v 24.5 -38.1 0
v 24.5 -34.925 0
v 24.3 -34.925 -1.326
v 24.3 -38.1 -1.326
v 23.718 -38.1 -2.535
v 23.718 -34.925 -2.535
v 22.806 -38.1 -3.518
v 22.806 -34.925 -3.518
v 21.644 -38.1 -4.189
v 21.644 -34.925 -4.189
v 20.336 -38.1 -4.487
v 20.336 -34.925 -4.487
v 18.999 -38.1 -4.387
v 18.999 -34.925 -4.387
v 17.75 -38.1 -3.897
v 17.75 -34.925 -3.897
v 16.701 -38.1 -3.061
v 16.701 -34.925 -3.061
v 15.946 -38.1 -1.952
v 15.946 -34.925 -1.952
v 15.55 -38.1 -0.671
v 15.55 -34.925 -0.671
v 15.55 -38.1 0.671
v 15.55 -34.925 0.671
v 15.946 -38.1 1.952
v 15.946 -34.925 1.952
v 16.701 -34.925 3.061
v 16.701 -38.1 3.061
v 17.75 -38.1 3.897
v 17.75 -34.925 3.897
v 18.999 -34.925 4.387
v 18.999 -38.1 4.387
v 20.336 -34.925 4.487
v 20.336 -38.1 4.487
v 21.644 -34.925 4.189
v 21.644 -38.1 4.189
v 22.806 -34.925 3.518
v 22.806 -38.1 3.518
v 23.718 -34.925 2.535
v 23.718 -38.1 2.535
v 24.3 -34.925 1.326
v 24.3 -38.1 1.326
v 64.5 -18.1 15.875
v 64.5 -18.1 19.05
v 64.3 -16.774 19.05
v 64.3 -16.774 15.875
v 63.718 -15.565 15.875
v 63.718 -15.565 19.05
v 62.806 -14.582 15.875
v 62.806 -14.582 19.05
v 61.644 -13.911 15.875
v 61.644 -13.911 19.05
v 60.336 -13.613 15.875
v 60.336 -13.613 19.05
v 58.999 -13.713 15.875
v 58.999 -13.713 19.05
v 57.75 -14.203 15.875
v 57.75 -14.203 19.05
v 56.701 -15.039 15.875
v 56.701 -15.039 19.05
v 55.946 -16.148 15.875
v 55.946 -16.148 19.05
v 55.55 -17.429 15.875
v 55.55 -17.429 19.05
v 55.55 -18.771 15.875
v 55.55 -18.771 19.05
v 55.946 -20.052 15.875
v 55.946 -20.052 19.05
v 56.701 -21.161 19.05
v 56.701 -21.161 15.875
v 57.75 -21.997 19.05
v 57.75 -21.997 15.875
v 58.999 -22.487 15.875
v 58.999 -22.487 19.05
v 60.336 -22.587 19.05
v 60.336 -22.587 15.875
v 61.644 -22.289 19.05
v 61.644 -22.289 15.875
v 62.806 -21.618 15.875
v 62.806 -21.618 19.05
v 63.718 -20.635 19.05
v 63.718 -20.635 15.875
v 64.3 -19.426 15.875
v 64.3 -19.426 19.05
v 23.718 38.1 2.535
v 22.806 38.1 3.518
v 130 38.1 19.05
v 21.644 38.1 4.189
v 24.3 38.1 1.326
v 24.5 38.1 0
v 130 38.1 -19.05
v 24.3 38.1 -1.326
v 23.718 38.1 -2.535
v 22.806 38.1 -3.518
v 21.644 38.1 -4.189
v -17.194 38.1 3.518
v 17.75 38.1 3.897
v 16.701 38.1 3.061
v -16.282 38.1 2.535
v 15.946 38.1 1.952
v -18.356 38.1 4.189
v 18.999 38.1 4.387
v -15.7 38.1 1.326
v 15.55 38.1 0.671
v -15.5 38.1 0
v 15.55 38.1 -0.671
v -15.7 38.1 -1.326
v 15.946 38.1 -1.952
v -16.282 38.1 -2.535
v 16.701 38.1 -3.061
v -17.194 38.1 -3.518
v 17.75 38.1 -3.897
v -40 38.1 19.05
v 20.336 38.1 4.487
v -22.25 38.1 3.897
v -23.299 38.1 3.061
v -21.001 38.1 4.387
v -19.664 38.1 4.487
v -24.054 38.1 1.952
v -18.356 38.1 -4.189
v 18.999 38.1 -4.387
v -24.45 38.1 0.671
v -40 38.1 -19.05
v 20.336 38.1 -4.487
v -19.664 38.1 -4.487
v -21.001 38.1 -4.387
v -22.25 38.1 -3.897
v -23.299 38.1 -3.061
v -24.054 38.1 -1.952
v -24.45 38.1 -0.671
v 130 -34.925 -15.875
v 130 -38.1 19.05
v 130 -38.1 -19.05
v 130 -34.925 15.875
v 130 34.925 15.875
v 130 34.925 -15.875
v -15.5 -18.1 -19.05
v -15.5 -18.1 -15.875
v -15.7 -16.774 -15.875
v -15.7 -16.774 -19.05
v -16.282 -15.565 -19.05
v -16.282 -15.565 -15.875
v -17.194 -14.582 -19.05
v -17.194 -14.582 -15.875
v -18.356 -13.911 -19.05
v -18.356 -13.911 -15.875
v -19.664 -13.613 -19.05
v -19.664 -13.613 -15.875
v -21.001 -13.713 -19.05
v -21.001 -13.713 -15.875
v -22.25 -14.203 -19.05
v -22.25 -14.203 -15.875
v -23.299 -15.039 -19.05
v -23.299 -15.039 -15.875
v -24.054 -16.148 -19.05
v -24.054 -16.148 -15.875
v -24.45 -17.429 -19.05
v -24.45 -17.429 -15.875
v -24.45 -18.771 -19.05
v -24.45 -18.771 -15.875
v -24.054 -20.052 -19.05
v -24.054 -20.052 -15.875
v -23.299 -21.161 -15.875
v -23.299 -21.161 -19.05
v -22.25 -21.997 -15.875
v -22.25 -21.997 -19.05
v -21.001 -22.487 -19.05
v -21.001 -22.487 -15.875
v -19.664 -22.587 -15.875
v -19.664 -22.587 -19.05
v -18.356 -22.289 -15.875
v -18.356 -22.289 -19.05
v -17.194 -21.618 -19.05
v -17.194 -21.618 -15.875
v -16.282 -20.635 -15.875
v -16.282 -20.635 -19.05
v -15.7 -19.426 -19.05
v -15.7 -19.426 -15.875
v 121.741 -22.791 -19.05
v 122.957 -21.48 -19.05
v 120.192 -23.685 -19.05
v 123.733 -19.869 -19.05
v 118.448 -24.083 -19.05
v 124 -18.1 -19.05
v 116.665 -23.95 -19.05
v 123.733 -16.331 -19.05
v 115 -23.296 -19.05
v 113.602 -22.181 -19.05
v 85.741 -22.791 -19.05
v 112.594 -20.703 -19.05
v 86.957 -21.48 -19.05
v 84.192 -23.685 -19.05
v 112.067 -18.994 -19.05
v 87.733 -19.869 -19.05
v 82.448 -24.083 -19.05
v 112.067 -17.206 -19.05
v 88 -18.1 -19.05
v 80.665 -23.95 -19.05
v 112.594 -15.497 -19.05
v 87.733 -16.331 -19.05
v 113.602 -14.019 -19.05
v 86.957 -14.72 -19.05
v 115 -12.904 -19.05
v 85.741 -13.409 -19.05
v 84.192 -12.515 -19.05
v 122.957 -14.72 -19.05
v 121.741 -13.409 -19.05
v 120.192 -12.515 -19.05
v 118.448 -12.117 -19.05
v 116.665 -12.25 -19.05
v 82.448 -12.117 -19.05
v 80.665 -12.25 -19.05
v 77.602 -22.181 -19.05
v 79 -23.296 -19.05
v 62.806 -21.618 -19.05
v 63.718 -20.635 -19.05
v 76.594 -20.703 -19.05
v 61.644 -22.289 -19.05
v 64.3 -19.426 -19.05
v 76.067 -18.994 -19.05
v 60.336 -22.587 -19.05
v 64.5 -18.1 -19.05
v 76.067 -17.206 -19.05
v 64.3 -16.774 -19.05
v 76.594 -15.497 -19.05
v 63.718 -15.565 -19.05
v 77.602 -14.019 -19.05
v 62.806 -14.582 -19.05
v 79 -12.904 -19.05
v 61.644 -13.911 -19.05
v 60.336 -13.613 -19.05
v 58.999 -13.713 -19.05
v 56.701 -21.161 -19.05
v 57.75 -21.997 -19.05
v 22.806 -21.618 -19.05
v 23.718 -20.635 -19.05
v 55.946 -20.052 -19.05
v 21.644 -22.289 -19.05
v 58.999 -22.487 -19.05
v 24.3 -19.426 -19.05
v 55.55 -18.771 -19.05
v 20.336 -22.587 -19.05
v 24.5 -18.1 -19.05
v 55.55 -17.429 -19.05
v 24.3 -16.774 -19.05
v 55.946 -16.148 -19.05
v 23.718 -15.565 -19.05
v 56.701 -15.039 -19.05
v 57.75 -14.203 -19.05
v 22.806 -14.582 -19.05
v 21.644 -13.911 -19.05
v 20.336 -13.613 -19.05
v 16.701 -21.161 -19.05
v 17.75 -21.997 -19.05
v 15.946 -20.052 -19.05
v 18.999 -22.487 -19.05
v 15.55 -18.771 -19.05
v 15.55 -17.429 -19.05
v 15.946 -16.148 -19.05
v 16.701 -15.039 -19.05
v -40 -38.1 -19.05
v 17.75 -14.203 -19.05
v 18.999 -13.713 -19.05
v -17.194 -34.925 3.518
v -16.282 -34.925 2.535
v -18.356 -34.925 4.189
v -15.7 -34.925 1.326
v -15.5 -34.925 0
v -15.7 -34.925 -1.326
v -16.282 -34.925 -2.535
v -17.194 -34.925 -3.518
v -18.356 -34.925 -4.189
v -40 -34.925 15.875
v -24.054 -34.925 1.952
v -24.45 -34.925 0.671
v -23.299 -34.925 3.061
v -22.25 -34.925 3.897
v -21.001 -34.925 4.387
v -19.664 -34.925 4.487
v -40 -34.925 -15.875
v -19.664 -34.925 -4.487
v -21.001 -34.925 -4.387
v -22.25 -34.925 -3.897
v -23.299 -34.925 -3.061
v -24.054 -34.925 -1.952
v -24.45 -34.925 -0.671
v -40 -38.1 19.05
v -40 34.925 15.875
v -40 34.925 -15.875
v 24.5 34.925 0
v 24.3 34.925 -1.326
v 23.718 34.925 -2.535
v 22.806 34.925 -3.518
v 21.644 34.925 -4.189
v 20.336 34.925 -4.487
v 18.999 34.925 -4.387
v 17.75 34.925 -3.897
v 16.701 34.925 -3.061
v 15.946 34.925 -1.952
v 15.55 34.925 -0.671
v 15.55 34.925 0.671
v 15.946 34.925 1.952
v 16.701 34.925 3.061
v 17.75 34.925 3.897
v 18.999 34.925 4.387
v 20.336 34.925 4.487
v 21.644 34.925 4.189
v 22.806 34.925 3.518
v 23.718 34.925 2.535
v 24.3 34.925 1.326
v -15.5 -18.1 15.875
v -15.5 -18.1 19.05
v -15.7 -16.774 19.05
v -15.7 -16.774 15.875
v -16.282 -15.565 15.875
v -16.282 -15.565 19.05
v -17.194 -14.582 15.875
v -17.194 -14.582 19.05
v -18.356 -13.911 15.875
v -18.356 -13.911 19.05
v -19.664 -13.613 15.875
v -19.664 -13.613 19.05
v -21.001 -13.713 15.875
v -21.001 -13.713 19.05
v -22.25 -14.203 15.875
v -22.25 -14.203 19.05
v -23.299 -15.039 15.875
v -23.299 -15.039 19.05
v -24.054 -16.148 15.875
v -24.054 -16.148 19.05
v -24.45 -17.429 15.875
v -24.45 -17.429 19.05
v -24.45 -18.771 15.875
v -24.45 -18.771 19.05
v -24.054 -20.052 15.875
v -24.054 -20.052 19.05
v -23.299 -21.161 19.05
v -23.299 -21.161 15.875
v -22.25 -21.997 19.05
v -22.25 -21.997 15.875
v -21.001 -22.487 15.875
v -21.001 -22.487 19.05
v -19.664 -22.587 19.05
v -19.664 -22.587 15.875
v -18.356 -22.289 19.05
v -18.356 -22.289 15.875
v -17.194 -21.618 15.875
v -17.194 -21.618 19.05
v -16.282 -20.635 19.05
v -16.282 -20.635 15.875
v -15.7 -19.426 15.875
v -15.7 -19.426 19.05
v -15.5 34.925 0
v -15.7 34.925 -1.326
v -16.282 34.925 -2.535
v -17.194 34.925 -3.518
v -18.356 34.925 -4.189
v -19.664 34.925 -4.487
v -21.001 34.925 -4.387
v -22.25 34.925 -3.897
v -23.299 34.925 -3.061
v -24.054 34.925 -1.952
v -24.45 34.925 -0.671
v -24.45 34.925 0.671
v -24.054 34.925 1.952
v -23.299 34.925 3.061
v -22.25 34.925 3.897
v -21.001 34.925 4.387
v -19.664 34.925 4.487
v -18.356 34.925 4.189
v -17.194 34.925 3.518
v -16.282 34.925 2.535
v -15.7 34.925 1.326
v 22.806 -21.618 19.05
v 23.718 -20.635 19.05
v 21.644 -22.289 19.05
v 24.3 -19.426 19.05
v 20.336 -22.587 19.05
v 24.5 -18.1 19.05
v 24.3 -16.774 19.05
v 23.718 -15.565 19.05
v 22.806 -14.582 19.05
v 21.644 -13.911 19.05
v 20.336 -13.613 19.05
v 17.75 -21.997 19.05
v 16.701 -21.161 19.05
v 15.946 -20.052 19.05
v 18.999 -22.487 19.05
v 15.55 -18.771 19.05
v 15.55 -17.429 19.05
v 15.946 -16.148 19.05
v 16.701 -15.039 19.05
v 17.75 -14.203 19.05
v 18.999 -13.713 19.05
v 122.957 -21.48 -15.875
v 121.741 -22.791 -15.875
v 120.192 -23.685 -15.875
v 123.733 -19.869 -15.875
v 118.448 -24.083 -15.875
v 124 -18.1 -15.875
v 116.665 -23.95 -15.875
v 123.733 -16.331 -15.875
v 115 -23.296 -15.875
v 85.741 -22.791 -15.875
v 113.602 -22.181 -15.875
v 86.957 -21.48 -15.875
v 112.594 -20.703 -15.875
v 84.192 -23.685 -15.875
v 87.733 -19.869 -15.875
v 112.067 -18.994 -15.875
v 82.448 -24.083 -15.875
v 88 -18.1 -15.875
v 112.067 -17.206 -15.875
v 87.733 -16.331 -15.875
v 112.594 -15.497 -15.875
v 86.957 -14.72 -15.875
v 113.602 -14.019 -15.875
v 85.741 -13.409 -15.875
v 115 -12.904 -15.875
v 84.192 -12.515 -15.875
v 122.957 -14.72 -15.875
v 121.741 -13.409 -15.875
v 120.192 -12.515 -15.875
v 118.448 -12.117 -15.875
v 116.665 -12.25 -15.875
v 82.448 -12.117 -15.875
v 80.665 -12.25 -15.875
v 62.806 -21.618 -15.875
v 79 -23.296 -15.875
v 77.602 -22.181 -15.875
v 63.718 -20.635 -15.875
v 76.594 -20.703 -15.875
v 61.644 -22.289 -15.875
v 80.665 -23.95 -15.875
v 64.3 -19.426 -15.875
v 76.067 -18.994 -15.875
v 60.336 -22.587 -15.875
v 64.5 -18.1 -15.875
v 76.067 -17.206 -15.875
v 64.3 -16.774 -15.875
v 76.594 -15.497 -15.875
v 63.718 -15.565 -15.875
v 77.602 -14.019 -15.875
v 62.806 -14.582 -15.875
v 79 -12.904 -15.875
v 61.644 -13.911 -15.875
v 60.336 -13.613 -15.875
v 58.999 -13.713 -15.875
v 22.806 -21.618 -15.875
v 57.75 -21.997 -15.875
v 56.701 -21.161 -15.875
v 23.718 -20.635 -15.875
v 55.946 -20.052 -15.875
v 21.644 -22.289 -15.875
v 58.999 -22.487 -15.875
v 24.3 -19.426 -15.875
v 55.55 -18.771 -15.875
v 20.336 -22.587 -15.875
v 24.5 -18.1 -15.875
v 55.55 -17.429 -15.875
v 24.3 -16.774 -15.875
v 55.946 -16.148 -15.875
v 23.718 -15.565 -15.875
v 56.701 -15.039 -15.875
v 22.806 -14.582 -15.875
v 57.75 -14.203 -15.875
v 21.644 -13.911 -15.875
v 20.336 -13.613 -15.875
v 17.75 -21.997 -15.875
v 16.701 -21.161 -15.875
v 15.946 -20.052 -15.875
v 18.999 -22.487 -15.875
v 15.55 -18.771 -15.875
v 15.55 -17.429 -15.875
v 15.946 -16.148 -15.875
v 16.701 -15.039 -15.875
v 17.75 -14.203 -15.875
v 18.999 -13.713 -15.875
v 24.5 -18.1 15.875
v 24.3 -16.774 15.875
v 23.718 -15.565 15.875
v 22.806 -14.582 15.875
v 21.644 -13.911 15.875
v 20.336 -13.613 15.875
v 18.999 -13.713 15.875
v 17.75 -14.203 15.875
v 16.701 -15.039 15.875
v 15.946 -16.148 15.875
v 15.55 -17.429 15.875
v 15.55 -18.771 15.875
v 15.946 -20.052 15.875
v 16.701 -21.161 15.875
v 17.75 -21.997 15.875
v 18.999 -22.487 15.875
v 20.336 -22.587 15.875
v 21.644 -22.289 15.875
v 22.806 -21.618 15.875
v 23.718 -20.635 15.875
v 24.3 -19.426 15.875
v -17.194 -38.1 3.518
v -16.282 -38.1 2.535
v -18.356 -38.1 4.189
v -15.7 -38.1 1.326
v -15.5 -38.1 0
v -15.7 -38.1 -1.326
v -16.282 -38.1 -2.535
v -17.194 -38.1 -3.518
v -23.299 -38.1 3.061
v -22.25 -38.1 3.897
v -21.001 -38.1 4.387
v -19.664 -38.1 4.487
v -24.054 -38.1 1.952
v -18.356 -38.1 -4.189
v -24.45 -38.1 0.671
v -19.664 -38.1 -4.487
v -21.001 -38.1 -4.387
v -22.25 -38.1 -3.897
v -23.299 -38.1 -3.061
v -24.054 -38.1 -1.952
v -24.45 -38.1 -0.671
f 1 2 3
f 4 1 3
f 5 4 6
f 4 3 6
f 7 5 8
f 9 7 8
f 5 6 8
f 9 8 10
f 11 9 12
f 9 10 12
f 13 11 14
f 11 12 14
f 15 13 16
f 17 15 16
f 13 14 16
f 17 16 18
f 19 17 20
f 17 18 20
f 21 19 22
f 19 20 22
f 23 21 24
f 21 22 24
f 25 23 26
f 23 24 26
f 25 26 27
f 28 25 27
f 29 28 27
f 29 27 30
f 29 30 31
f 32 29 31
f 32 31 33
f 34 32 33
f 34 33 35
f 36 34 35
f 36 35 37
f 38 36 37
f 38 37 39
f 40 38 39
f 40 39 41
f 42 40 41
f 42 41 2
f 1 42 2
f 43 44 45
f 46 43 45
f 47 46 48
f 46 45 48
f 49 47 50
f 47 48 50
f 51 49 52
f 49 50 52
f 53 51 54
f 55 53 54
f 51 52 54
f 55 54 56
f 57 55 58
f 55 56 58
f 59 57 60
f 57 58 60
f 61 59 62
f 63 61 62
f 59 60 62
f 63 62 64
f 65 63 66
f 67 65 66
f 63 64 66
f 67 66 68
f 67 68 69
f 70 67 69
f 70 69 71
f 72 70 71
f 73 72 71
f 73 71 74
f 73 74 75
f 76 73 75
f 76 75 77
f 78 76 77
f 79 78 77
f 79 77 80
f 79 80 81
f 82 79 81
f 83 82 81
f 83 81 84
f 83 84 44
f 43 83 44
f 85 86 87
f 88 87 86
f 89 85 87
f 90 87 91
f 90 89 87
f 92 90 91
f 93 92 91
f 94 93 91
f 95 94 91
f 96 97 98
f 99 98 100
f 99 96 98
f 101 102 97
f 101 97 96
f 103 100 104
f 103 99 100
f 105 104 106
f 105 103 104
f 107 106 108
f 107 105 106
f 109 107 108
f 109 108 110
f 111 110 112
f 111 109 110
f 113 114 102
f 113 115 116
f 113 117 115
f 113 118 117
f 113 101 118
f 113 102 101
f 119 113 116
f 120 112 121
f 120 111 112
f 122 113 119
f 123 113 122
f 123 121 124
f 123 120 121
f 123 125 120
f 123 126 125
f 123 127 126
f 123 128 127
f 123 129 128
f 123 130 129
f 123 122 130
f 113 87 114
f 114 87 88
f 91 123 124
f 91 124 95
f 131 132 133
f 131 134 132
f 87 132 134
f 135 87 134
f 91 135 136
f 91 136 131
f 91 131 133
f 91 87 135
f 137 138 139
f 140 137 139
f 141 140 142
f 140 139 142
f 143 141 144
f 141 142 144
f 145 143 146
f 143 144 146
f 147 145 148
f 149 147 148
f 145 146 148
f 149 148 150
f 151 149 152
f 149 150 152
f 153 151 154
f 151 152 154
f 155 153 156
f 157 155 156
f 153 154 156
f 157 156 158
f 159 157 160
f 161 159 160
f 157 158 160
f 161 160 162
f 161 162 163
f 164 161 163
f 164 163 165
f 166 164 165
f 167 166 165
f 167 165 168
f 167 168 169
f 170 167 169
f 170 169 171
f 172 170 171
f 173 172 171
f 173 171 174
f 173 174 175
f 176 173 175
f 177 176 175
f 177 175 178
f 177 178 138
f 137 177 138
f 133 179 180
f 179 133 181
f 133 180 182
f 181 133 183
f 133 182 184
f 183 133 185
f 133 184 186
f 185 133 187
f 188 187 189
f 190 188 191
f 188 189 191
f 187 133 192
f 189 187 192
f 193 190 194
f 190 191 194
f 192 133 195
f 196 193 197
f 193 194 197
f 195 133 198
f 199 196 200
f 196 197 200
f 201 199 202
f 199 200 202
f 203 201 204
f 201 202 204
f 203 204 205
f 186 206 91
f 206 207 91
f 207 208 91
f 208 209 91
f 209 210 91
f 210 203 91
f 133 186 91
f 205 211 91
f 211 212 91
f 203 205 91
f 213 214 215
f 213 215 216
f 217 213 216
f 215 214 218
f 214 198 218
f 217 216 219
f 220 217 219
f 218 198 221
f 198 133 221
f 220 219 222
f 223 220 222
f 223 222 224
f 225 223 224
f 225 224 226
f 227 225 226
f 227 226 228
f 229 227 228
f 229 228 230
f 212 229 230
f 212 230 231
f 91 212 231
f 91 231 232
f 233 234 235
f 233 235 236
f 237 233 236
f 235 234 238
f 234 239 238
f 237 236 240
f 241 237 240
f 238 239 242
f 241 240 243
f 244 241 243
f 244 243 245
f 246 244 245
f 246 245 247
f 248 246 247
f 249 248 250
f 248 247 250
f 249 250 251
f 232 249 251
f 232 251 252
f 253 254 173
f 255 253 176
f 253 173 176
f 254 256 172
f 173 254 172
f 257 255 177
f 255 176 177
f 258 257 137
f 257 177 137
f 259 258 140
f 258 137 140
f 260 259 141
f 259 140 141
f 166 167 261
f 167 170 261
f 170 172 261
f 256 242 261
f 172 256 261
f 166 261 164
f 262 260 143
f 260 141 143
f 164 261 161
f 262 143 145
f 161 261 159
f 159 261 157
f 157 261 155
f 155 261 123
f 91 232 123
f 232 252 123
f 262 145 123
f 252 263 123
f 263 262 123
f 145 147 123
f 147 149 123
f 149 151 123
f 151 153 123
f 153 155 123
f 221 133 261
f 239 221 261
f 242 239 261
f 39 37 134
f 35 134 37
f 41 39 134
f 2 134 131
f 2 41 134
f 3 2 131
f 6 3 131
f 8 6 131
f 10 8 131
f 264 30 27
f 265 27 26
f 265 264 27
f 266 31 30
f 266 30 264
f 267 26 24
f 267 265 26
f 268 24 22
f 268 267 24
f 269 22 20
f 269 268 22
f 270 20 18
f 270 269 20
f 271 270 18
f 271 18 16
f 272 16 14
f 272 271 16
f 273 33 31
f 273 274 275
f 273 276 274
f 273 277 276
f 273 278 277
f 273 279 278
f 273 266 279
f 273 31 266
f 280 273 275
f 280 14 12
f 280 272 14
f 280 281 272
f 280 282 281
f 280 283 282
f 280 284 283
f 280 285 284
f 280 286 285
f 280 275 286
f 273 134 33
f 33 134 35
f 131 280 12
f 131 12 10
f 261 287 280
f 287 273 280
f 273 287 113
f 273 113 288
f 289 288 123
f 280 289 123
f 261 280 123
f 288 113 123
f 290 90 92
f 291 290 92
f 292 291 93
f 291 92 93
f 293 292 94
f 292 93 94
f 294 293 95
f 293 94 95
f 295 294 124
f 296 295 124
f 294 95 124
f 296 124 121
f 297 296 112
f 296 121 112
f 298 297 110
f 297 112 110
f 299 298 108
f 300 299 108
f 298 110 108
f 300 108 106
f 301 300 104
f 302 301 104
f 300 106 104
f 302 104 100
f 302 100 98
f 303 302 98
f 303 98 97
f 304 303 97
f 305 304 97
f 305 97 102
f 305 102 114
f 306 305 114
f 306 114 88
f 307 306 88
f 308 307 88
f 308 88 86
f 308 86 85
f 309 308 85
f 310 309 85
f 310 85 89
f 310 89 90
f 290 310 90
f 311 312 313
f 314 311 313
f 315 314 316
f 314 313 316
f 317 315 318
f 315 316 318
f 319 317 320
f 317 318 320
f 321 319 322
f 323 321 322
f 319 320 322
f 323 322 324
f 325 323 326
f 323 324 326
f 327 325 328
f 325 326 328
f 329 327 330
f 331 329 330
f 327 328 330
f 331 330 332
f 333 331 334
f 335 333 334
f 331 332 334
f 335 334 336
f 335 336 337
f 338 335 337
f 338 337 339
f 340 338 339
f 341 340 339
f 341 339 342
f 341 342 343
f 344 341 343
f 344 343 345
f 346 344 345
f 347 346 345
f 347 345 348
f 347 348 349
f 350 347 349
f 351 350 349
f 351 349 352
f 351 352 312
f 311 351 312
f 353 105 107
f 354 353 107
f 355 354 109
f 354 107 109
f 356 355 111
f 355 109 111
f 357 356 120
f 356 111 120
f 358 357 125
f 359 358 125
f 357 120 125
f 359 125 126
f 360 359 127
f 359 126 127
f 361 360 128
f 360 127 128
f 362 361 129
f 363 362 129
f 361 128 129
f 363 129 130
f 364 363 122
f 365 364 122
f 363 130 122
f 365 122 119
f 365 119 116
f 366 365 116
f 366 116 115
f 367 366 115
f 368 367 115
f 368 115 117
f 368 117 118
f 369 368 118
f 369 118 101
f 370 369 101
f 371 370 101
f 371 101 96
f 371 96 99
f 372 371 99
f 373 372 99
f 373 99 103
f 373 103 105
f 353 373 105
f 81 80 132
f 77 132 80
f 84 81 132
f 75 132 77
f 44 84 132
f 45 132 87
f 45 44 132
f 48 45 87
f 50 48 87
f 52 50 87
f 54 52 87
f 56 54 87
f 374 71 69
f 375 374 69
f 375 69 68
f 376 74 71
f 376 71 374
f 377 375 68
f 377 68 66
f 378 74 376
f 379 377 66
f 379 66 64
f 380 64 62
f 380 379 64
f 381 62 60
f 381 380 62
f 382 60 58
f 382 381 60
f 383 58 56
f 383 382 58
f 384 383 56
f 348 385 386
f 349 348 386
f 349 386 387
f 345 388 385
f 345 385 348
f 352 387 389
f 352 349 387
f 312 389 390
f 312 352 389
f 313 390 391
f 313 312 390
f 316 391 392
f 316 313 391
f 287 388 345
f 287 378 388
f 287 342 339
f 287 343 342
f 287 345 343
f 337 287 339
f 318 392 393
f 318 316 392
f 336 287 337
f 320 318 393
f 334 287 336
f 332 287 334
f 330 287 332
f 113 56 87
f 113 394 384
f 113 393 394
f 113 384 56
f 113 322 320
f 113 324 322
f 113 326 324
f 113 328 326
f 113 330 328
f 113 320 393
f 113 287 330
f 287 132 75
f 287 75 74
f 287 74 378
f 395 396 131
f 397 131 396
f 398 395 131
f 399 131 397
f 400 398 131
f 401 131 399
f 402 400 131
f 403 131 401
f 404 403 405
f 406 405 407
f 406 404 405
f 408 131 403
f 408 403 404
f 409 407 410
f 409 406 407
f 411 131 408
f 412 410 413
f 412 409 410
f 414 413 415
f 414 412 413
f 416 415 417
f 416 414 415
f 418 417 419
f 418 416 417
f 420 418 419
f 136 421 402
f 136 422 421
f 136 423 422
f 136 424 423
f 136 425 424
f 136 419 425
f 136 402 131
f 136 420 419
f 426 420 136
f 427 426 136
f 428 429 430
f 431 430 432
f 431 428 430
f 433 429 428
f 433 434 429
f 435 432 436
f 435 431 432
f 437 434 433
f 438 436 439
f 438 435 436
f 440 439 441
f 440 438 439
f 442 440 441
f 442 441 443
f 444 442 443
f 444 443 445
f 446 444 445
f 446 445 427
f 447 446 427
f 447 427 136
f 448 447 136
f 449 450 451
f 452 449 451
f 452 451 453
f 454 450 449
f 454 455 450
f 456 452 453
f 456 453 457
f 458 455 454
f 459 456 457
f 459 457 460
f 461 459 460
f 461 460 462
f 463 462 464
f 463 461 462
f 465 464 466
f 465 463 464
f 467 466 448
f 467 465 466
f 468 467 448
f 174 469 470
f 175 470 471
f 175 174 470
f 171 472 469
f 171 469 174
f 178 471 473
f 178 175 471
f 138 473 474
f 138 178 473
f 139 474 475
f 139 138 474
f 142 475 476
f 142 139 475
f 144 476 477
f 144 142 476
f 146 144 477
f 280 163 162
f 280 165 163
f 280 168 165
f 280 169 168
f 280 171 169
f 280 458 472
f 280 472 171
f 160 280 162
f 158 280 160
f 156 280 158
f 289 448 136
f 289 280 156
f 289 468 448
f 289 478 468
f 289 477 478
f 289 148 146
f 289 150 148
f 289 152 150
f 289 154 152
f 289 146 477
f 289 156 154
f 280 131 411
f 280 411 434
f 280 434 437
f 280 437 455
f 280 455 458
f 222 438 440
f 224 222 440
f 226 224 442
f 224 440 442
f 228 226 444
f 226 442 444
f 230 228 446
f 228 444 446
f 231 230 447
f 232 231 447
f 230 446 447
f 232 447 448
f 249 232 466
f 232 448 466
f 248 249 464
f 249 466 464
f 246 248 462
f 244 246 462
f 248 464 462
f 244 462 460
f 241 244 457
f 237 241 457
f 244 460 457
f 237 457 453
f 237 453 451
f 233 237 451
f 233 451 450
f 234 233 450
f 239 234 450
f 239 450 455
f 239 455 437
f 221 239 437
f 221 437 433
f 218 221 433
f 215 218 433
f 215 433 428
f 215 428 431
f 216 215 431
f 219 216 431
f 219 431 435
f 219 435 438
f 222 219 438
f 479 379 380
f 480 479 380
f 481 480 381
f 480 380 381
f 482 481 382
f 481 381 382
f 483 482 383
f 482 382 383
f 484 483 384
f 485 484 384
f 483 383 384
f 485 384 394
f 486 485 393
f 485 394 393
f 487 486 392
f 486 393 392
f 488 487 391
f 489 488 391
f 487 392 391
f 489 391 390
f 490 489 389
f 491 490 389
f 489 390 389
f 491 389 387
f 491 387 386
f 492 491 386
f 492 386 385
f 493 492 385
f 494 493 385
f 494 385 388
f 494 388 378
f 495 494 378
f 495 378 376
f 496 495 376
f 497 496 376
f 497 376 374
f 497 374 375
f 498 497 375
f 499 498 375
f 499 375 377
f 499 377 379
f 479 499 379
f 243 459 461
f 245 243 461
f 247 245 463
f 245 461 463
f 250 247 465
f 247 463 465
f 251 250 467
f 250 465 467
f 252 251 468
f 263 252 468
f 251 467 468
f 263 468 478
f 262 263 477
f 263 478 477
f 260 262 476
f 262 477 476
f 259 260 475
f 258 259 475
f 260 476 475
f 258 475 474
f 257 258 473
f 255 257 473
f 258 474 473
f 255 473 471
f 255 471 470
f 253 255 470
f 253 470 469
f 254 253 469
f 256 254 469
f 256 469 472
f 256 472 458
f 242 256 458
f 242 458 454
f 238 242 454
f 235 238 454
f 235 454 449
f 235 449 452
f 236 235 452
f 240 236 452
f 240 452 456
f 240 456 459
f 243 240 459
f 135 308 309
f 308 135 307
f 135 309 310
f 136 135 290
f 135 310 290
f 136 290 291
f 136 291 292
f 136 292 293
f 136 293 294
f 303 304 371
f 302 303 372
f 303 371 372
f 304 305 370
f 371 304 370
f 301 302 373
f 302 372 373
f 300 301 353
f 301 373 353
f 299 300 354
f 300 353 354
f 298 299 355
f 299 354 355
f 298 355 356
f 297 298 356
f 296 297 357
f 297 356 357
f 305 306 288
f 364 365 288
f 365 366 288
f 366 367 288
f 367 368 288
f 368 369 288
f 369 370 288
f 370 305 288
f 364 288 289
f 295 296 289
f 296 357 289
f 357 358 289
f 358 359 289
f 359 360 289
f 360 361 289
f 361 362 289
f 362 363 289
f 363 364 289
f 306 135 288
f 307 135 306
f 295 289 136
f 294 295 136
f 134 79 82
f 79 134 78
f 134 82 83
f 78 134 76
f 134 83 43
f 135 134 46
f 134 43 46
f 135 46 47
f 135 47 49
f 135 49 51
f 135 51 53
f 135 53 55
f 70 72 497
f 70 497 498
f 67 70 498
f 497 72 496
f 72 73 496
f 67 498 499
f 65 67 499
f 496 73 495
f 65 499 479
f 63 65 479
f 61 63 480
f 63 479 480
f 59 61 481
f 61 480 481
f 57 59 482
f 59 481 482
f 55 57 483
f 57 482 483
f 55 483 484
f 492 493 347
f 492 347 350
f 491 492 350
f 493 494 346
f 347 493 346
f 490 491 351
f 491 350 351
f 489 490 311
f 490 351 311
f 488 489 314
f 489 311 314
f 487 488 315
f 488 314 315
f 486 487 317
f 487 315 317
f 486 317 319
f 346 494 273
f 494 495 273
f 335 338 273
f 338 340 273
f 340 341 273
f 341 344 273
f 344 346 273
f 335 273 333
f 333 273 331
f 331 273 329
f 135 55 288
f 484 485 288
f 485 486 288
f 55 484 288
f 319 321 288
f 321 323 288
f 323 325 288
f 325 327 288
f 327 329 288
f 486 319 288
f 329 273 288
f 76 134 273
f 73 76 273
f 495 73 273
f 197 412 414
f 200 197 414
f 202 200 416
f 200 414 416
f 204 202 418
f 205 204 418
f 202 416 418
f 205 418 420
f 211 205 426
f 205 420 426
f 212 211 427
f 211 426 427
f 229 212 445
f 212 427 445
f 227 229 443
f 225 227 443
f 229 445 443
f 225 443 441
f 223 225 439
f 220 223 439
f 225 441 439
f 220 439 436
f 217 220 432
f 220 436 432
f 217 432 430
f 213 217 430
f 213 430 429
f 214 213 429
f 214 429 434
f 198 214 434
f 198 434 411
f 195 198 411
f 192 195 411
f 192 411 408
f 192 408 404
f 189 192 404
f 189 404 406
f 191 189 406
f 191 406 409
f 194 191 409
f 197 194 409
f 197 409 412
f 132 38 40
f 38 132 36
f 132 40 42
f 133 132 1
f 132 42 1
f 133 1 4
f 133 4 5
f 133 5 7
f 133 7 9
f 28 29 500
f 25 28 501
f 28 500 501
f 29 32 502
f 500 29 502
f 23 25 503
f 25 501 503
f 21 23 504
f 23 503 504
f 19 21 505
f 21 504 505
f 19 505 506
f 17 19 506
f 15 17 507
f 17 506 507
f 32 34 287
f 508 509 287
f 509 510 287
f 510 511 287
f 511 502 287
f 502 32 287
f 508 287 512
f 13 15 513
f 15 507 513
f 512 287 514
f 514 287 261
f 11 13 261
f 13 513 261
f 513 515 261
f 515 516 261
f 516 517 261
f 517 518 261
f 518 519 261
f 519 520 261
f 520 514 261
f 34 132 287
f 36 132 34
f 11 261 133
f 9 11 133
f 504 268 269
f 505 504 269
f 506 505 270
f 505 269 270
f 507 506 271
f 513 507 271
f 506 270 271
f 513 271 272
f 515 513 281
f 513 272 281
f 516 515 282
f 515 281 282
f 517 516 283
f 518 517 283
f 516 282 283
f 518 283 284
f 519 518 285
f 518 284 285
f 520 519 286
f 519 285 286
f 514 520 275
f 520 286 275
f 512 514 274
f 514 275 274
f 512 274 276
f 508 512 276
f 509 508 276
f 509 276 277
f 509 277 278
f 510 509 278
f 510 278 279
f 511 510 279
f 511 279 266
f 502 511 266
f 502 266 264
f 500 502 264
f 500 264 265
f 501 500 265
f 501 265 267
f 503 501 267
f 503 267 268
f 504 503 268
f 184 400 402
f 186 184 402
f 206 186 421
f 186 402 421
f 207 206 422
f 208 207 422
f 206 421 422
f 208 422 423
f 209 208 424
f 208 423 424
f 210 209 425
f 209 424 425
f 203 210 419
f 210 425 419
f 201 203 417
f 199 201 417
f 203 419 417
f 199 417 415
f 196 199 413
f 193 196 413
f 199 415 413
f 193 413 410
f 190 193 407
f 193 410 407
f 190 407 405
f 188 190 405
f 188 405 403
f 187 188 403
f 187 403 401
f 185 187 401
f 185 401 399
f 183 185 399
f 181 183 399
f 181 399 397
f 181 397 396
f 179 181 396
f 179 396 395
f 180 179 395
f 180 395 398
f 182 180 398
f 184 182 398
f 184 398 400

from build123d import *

# Parameters (mm, degrees)
EXTRUDE_THIN1_START            = -40
SKETCH1_W                      = 38.1
SKETCH1_H                      = 76.2
SKETCH1_W_2                    = 31.75
SKETCH1_H_2                    = 69.85
EXTRUDE_THIN1_DEPTH            = 170
M8_CLEARANCE_HOLE2_D           = 9
M8_CLEARANCE_HOLE3_D           = 9
F_12_0_12_DIAMETER_HOLE1_D     = 12
F_12_0_12_DIAMETER_HOLE1_DEPTH = 3.175


with BuildPart() as part:
    # Sketch1 → Extrude-Thin1 (new body)
    with BuildSketch(Plane(origin=(0, 0, 0), x_dir=(0, 0, -1), z_dir=(1, 0, 0)).offset(EXTRUDE_THIN1_START)):
        Rectangle(SKETCH1_W, SKETCH1_H)
        Rectangle(SKETCH1_W_2, SKETCH1_H_2, mode=Mode.SUBTRACT)
    extrude(amount=EXTRUDE_THIN1_DEPTH)

    # M8 Clearance Hole2 (through all)
    with Locations(Plane(origin=(0, 0, -19.05), x_dir=(-1, 0, 0), z_dir=(0, 0, -1))):
        with Locations((20, -18.1), (-20, -18.1), (-60, -18.1)):
            Hole(M8_CLEARANCE_HOLE2_D / 2)

    # M8 Clearance Hole3 (through all)
    with Locations(Plane(origin=(0, -38.1, 0), x_dir=(-1, 0, 0), z_dir=(0, -1, 0))):
        with Locations((-20, 0), (20, 0)):
            Hole(M8_CLEARANCE_HOLE3_D / 2)

    # Ø12.0 (12) Diameter Hole1
    with Locations(Plane(origin=(0, 0, -19.05), x_dir=(-1, 0, 0), z_dir=(0, 0, -1))):
        with Locations((-118, -18.1), (-82, -18.1)):
            Hole(F_12_0_12_DIAMETER_HOLE1_D / 2, depth=F_12_0_12_DIAMETER_HOLE1_DEPTH)


solid = part.part
